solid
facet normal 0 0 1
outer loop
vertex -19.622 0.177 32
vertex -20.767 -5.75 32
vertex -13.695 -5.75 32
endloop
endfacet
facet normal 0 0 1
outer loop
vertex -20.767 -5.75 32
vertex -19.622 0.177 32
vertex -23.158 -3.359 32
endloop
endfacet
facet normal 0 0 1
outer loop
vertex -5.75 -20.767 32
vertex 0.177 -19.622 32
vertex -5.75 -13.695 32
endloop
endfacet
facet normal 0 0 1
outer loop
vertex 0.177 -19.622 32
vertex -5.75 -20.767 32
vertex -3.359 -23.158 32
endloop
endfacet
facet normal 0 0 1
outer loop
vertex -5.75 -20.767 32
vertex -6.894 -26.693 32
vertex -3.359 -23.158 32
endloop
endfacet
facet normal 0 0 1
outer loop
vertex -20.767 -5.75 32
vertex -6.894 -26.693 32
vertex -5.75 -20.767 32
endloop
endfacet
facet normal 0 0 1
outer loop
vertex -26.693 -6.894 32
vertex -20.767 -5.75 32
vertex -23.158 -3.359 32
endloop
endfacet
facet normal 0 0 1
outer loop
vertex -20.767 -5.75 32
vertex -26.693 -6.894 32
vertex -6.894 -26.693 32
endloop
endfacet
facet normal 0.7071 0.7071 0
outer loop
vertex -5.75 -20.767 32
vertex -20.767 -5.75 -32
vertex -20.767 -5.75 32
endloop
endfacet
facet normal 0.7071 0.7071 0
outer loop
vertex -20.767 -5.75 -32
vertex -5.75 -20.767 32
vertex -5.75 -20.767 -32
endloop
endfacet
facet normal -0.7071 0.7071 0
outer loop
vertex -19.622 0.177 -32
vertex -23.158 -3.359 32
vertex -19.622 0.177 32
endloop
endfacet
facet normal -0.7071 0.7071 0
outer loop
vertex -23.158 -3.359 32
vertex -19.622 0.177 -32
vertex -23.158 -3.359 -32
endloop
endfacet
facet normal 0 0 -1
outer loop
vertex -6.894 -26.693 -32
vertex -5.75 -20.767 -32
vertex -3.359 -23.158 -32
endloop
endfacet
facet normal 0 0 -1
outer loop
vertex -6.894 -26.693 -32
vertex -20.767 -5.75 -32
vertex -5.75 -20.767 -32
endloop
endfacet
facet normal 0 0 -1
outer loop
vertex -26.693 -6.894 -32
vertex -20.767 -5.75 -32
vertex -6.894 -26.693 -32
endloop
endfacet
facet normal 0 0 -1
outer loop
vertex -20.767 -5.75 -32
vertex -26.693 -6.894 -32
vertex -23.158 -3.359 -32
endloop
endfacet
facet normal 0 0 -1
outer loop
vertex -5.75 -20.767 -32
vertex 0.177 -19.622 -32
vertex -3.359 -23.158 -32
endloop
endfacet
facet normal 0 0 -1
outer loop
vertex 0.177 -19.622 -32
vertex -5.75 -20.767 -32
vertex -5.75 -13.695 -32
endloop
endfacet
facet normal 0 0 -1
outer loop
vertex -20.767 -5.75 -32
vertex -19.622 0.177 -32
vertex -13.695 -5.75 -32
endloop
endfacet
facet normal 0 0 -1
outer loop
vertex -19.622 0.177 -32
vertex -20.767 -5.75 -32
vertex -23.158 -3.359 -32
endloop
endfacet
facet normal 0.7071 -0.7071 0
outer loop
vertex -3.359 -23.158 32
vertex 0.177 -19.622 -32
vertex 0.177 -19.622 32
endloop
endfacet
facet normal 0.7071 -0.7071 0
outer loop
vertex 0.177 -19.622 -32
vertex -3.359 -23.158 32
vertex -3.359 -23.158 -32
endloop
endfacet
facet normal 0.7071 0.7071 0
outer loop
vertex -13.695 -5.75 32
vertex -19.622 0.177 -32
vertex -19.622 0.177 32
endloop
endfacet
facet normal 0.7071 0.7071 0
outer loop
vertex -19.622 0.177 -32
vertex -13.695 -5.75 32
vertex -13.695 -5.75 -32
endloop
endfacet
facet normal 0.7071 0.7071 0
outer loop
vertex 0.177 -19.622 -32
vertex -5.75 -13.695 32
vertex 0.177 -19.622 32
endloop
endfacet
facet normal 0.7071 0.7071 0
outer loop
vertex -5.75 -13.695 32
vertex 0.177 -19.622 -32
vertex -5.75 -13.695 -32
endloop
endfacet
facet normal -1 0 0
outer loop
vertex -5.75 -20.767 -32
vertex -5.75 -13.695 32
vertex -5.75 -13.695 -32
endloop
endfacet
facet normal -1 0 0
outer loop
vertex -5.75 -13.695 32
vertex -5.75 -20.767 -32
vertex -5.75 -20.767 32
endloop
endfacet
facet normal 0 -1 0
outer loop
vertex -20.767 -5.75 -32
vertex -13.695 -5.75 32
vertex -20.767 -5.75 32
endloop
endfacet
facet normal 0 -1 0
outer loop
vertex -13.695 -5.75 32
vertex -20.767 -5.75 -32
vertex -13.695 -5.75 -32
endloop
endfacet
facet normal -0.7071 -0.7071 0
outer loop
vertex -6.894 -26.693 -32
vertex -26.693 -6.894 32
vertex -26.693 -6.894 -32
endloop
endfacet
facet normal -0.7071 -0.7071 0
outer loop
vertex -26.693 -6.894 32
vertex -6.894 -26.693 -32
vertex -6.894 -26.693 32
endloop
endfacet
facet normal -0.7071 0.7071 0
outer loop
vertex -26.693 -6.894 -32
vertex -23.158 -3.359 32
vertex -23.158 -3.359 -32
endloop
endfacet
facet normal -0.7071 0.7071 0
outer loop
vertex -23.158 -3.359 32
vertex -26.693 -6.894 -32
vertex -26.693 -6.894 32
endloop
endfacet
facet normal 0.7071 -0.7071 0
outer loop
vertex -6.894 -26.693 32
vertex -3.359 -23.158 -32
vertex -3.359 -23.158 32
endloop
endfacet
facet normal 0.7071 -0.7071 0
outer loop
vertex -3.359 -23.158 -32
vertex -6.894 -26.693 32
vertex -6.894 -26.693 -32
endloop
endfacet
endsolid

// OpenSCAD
// diameter of flash light tube = 15.2 mm
// space between rings = 64 mm

module ring(tolerance=0.3, _fn=32) {
  body_radius = 15.2/2;
  $fn=_fn;

  difference() {
    union(){  
      difference() {
        cylinder(r=body_radius*1.8, h=10);

        translate([0,0,-1])
          cylinder(r=body_radius+tolerance, h=12);

        translate([body_radius,body_radius,-1])
          cylinder(r=body_radius*1.2, h=12);

      }
      
      tabSize = [10,20, 0];
      rotate([0,0,45])
      translate(tabSize*-0.5+[-body_radius*1.8,0,0])
      cube(tabSize+[0,0,10]);
    }
    
    cutoutSize=[20,20,20];
    
    translate(cutoutSize*-0.5+[-24,4,0])
    cube(cutoutSize+[0,0,10]);
    
    translate(cutoutSize*-0.5+[4,-24,0])
    cube(cutoutSize+[0,0,10]);    

  }
}

module rail(tolerance=0.25) {
  union() {
    difference(){
      topSize = [5,28,64];
      
      rotate([0,0,45])
      translate(topSize*-.5 + [-16-tolerance,-0,0])
        cube(topSize);
      
      shaftSize=[20,20,64];
      shaftOffset = -16+tolerance;

      translate(shaftSize*-0.5+[shaftOffset,shaftOffset,-1])
      cube(shaftSize+[0,0,10]);
    
    }

      topSize = [5,28,64];
      rotate([0,0,45])
      translate(topSize*-.5 + [-16-5-tolerance,-0,0])
        cube(topSize);

    /*
      stopSize = [10,28,4];
      rotate([0,0,45])
      translate(stopSize*-.5 + [-18.5-tolerance,0,22])
        cube(stopSize);

      rotate([0,0,45])
      translate(stopSize*-.5 + [-18.5-tolerance,0,22])
        cube(stopSize);
    */
  }
}

rail();
//ring();
